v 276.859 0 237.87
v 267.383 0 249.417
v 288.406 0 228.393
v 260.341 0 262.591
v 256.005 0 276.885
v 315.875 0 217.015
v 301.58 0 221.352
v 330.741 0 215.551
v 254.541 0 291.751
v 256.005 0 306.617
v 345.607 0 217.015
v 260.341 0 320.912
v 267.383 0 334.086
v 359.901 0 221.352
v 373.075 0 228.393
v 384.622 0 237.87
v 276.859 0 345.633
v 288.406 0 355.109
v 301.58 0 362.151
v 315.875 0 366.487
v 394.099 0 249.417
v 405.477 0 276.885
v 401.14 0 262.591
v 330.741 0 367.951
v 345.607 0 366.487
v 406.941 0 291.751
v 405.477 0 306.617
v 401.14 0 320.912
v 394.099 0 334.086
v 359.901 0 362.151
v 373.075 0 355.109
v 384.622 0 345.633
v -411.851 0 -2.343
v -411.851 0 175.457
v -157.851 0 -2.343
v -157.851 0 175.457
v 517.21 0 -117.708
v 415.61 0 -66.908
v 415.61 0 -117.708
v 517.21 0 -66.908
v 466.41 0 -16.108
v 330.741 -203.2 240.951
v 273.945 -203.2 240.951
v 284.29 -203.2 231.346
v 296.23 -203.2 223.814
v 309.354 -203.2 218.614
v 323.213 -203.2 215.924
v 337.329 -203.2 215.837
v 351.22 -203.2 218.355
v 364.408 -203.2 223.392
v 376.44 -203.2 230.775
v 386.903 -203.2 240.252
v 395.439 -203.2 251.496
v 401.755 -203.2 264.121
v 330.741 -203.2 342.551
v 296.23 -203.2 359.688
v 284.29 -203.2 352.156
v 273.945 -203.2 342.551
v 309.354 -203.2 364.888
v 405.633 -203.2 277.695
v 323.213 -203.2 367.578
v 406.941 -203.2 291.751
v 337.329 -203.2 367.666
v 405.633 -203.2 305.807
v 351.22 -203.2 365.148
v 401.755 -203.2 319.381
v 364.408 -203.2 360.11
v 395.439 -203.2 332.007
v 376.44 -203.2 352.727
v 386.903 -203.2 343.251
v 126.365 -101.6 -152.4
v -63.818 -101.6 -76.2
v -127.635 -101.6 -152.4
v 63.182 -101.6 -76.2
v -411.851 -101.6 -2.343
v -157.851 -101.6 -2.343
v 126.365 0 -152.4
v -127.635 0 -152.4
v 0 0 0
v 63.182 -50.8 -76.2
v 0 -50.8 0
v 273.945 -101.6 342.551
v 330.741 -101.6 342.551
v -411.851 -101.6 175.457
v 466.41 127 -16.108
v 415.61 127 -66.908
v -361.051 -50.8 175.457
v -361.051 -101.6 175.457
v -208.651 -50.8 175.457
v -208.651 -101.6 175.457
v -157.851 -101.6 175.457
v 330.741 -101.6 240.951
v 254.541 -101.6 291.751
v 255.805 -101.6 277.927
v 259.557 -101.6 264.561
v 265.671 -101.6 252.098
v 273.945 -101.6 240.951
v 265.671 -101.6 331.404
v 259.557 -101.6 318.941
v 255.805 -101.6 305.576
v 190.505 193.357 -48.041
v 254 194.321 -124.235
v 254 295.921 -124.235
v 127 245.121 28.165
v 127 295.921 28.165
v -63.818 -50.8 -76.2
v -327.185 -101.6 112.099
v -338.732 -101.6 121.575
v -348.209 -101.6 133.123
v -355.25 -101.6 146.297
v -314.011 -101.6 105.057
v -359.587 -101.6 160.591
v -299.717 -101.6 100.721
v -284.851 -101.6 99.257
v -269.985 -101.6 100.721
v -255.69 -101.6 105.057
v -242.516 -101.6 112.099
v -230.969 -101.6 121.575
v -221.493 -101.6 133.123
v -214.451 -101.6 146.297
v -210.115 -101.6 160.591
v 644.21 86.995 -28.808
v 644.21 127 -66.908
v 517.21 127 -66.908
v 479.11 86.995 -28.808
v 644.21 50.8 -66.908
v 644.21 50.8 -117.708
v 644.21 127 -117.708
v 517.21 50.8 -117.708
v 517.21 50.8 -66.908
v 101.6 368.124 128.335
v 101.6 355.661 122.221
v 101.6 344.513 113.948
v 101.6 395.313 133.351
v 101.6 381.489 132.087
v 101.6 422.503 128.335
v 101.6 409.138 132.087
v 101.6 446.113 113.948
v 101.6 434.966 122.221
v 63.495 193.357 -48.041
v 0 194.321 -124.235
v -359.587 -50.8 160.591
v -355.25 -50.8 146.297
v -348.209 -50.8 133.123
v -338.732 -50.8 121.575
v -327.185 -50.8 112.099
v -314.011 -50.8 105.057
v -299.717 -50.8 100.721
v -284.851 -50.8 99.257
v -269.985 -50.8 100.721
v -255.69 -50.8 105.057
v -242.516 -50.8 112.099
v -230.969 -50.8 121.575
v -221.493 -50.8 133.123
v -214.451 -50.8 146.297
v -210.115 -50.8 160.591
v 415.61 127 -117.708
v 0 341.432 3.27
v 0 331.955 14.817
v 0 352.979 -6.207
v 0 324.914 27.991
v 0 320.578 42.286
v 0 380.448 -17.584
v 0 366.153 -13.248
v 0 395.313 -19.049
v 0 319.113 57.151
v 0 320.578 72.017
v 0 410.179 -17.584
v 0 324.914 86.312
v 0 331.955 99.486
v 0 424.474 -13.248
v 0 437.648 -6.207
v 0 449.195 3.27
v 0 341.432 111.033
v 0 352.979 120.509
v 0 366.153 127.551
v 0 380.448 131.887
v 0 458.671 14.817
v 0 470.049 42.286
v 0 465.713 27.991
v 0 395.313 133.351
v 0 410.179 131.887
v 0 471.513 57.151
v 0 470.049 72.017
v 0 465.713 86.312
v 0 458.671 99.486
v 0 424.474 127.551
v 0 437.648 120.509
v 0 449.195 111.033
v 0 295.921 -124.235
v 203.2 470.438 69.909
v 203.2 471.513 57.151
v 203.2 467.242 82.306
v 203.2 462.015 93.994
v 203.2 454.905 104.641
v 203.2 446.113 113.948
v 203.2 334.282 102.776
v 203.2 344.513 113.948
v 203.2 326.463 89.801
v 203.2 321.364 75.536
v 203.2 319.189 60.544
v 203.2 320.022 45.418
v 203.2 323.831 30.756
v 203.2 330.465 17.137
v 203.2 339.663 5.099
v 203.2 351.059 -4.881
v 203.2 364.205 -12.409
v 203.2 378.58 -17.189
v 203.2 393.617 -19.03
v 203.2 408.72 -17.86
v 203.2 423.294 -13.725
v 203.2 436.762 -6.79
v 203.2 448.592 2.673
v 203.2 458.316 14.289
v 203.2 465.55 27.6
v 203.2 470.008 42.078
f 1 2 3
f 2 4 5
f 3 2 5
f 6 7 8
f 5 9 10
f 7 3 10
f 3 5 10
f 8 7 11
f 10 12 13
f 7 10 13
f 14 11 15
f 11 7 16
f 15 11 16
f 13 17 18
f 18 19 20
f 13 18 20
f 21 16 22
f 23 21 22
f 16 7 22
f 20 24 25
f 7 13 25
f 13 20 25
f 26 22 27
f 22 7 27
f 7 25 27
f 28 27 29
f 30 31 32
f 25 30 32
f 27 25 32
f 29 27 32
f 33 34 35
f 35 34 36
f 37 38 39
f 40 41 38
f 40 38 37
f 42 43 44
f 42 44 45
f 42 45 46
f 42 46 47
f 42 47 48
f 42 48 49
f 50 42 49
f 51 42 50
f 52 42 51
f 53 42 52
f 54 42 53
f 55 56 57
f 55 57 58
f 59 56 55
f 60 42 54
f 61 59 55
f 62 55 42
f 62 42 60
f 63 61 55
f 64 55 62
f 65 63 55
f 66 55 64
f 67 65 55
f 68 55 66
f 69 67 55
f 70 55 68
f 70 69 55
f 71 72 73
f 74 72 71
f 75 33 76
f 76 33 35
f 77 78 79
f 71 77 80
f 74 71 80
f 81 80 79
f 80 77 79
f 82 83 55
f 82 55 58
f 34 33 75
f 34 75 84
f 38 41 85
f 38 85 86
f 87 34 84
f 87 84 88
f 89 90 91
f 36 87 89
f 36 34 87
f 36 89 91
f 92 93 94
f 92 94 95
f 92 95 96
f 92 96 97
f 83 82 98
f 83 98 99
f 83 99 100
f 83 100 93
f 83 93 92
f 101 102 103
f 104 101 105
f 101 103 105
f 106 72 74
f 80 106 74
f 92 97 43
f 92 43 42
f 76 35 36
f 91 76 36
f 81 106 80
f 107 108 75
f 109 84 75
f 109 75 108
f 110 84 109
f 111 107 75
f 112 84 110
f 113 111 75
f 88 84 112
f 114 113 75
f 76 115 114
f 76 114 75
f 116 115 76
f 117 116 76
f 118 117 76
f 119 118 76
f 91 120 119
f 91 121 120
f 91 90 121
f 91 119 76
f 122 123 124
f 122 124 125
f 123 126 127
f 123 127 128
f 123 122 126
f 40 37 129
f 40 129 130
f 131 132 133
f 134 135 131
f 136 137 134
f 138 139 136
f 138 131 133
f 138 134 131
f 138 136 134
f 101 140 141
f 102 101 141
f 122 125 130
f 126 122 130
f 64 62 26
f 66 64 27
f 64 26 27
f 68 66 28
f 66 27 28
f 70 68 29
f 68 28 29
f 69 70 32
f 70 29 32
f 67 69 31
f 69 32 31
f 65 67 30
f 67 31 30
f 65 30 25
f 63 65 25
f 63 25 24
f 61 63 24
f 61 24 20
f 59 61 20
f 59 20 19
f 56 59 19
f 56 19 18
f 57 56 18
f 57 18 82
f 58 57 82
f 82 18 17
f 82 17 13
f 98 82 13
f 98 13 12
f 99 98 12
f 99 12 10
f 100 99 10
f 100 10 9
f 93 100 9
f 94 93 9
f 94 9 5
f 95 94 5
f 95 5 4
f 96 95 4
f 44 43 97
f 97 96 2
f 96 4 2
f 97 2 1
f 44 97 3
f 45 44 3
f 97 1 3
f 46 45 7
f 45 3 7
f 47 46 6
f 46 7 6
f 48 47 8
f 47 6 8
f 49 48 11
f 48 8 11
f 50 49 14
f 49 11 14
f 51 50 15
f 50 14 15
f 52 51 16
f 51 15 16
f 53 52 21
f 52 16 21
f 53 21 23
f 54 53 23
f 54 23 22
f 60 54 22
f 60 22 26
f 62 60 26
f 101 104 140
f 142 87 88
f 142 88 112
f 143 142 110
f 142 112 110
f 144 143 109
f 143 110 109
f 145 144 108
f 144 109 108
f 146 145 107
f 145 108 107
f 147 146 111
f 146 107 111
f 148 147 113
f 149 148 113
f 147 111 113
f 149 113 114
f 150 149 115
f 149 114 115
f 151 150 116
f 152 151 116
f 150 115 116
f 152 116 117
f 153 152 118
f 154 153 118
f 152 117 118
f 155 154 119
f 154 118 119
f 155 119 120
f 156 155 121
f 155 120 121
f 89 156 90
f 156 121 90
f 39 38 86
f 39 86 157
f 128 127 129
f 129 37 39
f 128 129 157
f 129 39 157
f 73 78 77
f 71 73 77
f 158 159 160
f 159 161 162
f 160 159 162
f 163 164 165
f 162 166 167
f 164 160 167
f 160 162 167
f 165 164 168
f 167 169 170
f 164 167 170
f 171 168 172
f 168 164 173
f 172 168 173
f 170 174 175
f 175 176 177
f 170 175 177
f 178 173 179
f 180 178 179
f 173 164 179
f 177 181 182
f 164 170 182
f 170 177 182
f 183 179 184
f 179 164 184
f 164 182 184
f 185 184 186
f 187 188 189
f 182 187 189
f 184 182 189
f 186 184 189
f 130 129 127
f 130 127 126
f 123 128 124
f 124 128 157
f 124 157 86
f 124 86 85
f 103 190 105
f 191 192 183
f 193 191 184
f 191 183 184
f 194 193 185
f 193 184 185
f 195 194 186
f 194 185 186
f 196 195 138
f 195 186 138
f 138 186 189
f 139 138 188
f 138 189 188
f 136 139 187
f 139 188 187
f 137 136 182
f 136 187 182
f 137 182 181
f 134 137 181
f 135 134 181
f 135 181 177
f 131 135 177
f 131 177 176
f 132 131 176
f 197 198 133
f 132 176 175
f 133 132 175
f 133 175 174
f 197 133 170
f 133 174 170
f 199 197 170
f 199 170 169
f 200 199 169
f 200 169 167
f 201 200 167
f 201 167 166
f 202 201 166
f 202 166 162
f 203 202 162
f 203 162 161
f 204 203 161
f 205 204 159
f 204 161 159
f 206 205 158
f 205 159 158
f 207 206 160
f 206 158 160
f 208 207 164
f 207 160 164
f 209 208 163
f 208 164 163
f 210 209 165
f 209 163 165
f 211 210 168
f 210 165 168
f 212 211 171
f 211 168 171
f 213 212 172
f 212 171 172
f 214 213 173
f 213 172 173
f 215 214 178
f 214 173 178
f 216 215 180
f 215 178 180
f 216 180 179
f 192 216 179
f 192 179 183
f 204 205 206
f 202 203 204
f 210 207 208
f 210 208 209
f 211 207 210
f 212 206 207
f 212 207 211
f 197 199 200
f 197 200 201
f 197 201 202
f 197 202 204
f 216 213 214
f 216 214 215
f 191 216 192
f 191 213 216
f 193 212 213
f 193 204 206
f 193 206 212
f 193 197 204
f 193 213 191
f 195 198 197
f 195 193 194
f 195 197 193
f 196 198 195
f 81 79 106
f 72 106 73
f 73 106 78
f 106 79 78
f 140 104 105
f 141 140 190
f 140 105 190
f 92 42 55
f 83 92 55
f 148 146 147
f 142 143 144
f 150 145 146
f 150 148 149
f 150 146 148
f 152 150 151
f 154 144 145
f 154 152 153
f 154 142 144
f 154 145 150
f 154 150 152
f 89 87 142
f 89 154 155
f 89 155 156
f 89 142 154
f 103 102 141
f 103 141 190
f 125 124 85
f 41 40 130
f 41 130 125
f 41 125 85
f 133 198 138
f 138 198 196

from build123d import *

# Parameters (mm, degrees)
F1_DEPTH  = 101.6
F3_DEPTH  = 50.8
F5_DEPTH  = 254
F7_DEPTH  = 254
F9_DEPTH  = 254
F11_DEPTH = 127
F12_W     = 76.2
F12_H     = 50.8
F13_DEPTH = 127
F15_R     = 76.2
F16_DEPTH = 203.2
F18_DEPTH = 101.6
F19_R     = 76.2
F20_DEPTH = 203.2
F22_DEPTH = 101.6
F23_W     = 254
F23_H     = 177.8
F24_DEPTH = 101.6
F26_DEPTH = 50.8


with BuildPart() as f1:
    # F0 (on Front) → F1 (new body)
    with BuildSketch(Plane.XZ):
        Polygon((0, 0), (-127.6350005588, -152.4), (126.3649994412, -152.4), align=None)
    extrude(amount=F1_DEPTH)

    # F2 (on face) → F3 (cut)
    with BuildSketch(Plane.XZ.offset(101.6)):
        Polygon((0, 0), (-63.8175002794, -76.2), (63.1824997206, -76.2), align=None)
    extrude(amount=-F3_DEPTH, mode=Mode.SUBTRACT)


with BuildPart() as f5:
    # F4 (on Right) → F5 (new body)
    with BuildSketch(Plane.YZ):
        Polygon((193.3565672969, -48.0408182748), (194.32102892, -124.2347144462), (295.92102892, -124.2347144462), (295.92102892, 28.1652855538), (245.12102892, 28.1652855538), align=None)
    extrude(amount=F5_DEPTH)

    # F6 (on face) → F7 (cut)
    with BuildSketch(Plane(origin=(0, 295.92102892, 0), x_dir=(-1, 0, 0), z_dir=(0, 1, 0))):
        Polygon((-254, 28.1652855538), (-254, -124.2347144462), (-127, 28.1652855538), align=None)
    extrude(amount=-F7_DEPTH, mode=Mode.SUBTRACT)

    # F8 (on face) → F9 (cut)
    with BuildSketch(Plane(origin=(0, 295.92102892, 0), x_dir=(-1, 0, 0), z_dir=(0, 1, 0))):
        Polygon((-127, 28.1652855538), (0, -124.2347144462), (0, 28.1652855538), align=None)
    extrude(amount=-F9_DEPTH, mode=Mode.SUBTRACT)


with BuildPart() as f11:
    # F10 (on Front) → F11 (new body)
    with BuildSketch(Plane.XZ):
        Polygon((415.6096123431, -66.908387676), (415.6096123431, -117.708387676), (517.2096123431, -117.708387676), (517.2096123431, -66.908387676), (466.4096123431, -16.108387676), align=None)
    extrude(amount=-F11_DEPTH)

    # F12 (on face) → F13 (join)
    with BuildSketch(Plane.YZ.offset(517.2096123431)):
        with Locations((88.9, -92.308387676)):
            Rectangle(F12_W, F12_H)
        Polygon((50.8, -66.908387676), (127, -66.908387676), (86.994998771, -28.808387676), align=None)
    extrude(amount=F13_DEPTH)

    # F12 (on face) → F14 (join, up to the next surface of F11)
    with BuildSketch(Plane.YZ.offset(517.2096123431)):
        Polygon((50.8, -66.908387676), (127, -66.908387676), (86.994998771, -28.808387676), align=None)
    extrude(until=Until.NEXT, dir=(-1, 0, 0))


with BuildPart() as f16:
    # F15 (on Right) → F16 (new body)
    with BuildSketch(Plane.YZ):
        with Locations((395.3134715557, 57.1514479816)):
            Circle(F15_R)
    extrude(amount=F16_DEPTH)

    # F17 (on face) → F18 (cut)
    with BuildSketch(Plane.YZ.offset(203.2)):
        with BuildLine():
            ThreePointArc((446.1134715557, 113.9475746101), (395.3134715557, 133.3514479816), (344.5134715557, 113.9475746101))
            Line((344.5134715557, 113.9475746101), (446.1134715557, 113.9475746101))
        make_face()
    extrude(amount=-F18_DEPTH, mode=Mode.SUBTRACT)


with BuildPart() as f20:
    # F19 (on Front) → F20 (new body)
    with BuildSketch(Plane.XZ):
        with Locations((330.7407200336, 291.7511761189)):
            Circle(F19_R)
    extrude(amount=F20_DEPTH)

    # F21 (on face) → F22 (cut)
    with BuildSketch(Plane.XZ.offset(203.2)):
        with BuildLine():
            Line((330.7407200336, 342.5511761189), (273.9445934052, 342.5511761189))
            ThreePointArc((273.9445934052, 342.5511761189), (254.5407200336, 291.7511761189), (273.9445934052, 240.9511761189))
            Line((273.9445934052, 240.9511761189), (330.7407200336, 240.9511761189))
            Line((330.7407200336, 240.9511761189), (330.7407200336, 342.5511761189))
        make_face()
    extrude(amount=-F22_DEPTH, mode=Mode.SUBTRACT)


with BuildPart() as f24:
    # F23 (on Front) → F24 (new body)
    with BuildSketch(Plane.XZ):
        with Locations((-284.8508283496, 86.5570213336)):
            Rectangle(F23_W, F23_H)
    extrude(amount=F24_DEPTH)

    # F25 (on face) → F26 (cut)
    with BuildSketch(Plane.XZ.offset(101.6)):
        with BuildLine():
            Line((-361.0508283496, 175.4570213336), (-208.6508283496, 175.4570213336))
            ThreePointArc((-208.6508283496, 175.4570213336), (-284.8508283496, 251.6570213336), (-361.0508283496, 175.4570213336))
        make_face()
        with BuildLine():
            ThreePointArc((-361.0508283496, 175.4570213336), (-284.8508283496, 99.2570213336), (-208.6508283496, 175.4570213336))
            Line((-208.6508283496, 175.4570213336), (-361.0508283496, 175.4570213336))
        make_face()
    extrude(amount=-F26_DEPTH, mode=Mode.SUBTRACT)


solid = Compound([f1.part, f5.part, f11.part, f16.part, f20.part, f24.part])
